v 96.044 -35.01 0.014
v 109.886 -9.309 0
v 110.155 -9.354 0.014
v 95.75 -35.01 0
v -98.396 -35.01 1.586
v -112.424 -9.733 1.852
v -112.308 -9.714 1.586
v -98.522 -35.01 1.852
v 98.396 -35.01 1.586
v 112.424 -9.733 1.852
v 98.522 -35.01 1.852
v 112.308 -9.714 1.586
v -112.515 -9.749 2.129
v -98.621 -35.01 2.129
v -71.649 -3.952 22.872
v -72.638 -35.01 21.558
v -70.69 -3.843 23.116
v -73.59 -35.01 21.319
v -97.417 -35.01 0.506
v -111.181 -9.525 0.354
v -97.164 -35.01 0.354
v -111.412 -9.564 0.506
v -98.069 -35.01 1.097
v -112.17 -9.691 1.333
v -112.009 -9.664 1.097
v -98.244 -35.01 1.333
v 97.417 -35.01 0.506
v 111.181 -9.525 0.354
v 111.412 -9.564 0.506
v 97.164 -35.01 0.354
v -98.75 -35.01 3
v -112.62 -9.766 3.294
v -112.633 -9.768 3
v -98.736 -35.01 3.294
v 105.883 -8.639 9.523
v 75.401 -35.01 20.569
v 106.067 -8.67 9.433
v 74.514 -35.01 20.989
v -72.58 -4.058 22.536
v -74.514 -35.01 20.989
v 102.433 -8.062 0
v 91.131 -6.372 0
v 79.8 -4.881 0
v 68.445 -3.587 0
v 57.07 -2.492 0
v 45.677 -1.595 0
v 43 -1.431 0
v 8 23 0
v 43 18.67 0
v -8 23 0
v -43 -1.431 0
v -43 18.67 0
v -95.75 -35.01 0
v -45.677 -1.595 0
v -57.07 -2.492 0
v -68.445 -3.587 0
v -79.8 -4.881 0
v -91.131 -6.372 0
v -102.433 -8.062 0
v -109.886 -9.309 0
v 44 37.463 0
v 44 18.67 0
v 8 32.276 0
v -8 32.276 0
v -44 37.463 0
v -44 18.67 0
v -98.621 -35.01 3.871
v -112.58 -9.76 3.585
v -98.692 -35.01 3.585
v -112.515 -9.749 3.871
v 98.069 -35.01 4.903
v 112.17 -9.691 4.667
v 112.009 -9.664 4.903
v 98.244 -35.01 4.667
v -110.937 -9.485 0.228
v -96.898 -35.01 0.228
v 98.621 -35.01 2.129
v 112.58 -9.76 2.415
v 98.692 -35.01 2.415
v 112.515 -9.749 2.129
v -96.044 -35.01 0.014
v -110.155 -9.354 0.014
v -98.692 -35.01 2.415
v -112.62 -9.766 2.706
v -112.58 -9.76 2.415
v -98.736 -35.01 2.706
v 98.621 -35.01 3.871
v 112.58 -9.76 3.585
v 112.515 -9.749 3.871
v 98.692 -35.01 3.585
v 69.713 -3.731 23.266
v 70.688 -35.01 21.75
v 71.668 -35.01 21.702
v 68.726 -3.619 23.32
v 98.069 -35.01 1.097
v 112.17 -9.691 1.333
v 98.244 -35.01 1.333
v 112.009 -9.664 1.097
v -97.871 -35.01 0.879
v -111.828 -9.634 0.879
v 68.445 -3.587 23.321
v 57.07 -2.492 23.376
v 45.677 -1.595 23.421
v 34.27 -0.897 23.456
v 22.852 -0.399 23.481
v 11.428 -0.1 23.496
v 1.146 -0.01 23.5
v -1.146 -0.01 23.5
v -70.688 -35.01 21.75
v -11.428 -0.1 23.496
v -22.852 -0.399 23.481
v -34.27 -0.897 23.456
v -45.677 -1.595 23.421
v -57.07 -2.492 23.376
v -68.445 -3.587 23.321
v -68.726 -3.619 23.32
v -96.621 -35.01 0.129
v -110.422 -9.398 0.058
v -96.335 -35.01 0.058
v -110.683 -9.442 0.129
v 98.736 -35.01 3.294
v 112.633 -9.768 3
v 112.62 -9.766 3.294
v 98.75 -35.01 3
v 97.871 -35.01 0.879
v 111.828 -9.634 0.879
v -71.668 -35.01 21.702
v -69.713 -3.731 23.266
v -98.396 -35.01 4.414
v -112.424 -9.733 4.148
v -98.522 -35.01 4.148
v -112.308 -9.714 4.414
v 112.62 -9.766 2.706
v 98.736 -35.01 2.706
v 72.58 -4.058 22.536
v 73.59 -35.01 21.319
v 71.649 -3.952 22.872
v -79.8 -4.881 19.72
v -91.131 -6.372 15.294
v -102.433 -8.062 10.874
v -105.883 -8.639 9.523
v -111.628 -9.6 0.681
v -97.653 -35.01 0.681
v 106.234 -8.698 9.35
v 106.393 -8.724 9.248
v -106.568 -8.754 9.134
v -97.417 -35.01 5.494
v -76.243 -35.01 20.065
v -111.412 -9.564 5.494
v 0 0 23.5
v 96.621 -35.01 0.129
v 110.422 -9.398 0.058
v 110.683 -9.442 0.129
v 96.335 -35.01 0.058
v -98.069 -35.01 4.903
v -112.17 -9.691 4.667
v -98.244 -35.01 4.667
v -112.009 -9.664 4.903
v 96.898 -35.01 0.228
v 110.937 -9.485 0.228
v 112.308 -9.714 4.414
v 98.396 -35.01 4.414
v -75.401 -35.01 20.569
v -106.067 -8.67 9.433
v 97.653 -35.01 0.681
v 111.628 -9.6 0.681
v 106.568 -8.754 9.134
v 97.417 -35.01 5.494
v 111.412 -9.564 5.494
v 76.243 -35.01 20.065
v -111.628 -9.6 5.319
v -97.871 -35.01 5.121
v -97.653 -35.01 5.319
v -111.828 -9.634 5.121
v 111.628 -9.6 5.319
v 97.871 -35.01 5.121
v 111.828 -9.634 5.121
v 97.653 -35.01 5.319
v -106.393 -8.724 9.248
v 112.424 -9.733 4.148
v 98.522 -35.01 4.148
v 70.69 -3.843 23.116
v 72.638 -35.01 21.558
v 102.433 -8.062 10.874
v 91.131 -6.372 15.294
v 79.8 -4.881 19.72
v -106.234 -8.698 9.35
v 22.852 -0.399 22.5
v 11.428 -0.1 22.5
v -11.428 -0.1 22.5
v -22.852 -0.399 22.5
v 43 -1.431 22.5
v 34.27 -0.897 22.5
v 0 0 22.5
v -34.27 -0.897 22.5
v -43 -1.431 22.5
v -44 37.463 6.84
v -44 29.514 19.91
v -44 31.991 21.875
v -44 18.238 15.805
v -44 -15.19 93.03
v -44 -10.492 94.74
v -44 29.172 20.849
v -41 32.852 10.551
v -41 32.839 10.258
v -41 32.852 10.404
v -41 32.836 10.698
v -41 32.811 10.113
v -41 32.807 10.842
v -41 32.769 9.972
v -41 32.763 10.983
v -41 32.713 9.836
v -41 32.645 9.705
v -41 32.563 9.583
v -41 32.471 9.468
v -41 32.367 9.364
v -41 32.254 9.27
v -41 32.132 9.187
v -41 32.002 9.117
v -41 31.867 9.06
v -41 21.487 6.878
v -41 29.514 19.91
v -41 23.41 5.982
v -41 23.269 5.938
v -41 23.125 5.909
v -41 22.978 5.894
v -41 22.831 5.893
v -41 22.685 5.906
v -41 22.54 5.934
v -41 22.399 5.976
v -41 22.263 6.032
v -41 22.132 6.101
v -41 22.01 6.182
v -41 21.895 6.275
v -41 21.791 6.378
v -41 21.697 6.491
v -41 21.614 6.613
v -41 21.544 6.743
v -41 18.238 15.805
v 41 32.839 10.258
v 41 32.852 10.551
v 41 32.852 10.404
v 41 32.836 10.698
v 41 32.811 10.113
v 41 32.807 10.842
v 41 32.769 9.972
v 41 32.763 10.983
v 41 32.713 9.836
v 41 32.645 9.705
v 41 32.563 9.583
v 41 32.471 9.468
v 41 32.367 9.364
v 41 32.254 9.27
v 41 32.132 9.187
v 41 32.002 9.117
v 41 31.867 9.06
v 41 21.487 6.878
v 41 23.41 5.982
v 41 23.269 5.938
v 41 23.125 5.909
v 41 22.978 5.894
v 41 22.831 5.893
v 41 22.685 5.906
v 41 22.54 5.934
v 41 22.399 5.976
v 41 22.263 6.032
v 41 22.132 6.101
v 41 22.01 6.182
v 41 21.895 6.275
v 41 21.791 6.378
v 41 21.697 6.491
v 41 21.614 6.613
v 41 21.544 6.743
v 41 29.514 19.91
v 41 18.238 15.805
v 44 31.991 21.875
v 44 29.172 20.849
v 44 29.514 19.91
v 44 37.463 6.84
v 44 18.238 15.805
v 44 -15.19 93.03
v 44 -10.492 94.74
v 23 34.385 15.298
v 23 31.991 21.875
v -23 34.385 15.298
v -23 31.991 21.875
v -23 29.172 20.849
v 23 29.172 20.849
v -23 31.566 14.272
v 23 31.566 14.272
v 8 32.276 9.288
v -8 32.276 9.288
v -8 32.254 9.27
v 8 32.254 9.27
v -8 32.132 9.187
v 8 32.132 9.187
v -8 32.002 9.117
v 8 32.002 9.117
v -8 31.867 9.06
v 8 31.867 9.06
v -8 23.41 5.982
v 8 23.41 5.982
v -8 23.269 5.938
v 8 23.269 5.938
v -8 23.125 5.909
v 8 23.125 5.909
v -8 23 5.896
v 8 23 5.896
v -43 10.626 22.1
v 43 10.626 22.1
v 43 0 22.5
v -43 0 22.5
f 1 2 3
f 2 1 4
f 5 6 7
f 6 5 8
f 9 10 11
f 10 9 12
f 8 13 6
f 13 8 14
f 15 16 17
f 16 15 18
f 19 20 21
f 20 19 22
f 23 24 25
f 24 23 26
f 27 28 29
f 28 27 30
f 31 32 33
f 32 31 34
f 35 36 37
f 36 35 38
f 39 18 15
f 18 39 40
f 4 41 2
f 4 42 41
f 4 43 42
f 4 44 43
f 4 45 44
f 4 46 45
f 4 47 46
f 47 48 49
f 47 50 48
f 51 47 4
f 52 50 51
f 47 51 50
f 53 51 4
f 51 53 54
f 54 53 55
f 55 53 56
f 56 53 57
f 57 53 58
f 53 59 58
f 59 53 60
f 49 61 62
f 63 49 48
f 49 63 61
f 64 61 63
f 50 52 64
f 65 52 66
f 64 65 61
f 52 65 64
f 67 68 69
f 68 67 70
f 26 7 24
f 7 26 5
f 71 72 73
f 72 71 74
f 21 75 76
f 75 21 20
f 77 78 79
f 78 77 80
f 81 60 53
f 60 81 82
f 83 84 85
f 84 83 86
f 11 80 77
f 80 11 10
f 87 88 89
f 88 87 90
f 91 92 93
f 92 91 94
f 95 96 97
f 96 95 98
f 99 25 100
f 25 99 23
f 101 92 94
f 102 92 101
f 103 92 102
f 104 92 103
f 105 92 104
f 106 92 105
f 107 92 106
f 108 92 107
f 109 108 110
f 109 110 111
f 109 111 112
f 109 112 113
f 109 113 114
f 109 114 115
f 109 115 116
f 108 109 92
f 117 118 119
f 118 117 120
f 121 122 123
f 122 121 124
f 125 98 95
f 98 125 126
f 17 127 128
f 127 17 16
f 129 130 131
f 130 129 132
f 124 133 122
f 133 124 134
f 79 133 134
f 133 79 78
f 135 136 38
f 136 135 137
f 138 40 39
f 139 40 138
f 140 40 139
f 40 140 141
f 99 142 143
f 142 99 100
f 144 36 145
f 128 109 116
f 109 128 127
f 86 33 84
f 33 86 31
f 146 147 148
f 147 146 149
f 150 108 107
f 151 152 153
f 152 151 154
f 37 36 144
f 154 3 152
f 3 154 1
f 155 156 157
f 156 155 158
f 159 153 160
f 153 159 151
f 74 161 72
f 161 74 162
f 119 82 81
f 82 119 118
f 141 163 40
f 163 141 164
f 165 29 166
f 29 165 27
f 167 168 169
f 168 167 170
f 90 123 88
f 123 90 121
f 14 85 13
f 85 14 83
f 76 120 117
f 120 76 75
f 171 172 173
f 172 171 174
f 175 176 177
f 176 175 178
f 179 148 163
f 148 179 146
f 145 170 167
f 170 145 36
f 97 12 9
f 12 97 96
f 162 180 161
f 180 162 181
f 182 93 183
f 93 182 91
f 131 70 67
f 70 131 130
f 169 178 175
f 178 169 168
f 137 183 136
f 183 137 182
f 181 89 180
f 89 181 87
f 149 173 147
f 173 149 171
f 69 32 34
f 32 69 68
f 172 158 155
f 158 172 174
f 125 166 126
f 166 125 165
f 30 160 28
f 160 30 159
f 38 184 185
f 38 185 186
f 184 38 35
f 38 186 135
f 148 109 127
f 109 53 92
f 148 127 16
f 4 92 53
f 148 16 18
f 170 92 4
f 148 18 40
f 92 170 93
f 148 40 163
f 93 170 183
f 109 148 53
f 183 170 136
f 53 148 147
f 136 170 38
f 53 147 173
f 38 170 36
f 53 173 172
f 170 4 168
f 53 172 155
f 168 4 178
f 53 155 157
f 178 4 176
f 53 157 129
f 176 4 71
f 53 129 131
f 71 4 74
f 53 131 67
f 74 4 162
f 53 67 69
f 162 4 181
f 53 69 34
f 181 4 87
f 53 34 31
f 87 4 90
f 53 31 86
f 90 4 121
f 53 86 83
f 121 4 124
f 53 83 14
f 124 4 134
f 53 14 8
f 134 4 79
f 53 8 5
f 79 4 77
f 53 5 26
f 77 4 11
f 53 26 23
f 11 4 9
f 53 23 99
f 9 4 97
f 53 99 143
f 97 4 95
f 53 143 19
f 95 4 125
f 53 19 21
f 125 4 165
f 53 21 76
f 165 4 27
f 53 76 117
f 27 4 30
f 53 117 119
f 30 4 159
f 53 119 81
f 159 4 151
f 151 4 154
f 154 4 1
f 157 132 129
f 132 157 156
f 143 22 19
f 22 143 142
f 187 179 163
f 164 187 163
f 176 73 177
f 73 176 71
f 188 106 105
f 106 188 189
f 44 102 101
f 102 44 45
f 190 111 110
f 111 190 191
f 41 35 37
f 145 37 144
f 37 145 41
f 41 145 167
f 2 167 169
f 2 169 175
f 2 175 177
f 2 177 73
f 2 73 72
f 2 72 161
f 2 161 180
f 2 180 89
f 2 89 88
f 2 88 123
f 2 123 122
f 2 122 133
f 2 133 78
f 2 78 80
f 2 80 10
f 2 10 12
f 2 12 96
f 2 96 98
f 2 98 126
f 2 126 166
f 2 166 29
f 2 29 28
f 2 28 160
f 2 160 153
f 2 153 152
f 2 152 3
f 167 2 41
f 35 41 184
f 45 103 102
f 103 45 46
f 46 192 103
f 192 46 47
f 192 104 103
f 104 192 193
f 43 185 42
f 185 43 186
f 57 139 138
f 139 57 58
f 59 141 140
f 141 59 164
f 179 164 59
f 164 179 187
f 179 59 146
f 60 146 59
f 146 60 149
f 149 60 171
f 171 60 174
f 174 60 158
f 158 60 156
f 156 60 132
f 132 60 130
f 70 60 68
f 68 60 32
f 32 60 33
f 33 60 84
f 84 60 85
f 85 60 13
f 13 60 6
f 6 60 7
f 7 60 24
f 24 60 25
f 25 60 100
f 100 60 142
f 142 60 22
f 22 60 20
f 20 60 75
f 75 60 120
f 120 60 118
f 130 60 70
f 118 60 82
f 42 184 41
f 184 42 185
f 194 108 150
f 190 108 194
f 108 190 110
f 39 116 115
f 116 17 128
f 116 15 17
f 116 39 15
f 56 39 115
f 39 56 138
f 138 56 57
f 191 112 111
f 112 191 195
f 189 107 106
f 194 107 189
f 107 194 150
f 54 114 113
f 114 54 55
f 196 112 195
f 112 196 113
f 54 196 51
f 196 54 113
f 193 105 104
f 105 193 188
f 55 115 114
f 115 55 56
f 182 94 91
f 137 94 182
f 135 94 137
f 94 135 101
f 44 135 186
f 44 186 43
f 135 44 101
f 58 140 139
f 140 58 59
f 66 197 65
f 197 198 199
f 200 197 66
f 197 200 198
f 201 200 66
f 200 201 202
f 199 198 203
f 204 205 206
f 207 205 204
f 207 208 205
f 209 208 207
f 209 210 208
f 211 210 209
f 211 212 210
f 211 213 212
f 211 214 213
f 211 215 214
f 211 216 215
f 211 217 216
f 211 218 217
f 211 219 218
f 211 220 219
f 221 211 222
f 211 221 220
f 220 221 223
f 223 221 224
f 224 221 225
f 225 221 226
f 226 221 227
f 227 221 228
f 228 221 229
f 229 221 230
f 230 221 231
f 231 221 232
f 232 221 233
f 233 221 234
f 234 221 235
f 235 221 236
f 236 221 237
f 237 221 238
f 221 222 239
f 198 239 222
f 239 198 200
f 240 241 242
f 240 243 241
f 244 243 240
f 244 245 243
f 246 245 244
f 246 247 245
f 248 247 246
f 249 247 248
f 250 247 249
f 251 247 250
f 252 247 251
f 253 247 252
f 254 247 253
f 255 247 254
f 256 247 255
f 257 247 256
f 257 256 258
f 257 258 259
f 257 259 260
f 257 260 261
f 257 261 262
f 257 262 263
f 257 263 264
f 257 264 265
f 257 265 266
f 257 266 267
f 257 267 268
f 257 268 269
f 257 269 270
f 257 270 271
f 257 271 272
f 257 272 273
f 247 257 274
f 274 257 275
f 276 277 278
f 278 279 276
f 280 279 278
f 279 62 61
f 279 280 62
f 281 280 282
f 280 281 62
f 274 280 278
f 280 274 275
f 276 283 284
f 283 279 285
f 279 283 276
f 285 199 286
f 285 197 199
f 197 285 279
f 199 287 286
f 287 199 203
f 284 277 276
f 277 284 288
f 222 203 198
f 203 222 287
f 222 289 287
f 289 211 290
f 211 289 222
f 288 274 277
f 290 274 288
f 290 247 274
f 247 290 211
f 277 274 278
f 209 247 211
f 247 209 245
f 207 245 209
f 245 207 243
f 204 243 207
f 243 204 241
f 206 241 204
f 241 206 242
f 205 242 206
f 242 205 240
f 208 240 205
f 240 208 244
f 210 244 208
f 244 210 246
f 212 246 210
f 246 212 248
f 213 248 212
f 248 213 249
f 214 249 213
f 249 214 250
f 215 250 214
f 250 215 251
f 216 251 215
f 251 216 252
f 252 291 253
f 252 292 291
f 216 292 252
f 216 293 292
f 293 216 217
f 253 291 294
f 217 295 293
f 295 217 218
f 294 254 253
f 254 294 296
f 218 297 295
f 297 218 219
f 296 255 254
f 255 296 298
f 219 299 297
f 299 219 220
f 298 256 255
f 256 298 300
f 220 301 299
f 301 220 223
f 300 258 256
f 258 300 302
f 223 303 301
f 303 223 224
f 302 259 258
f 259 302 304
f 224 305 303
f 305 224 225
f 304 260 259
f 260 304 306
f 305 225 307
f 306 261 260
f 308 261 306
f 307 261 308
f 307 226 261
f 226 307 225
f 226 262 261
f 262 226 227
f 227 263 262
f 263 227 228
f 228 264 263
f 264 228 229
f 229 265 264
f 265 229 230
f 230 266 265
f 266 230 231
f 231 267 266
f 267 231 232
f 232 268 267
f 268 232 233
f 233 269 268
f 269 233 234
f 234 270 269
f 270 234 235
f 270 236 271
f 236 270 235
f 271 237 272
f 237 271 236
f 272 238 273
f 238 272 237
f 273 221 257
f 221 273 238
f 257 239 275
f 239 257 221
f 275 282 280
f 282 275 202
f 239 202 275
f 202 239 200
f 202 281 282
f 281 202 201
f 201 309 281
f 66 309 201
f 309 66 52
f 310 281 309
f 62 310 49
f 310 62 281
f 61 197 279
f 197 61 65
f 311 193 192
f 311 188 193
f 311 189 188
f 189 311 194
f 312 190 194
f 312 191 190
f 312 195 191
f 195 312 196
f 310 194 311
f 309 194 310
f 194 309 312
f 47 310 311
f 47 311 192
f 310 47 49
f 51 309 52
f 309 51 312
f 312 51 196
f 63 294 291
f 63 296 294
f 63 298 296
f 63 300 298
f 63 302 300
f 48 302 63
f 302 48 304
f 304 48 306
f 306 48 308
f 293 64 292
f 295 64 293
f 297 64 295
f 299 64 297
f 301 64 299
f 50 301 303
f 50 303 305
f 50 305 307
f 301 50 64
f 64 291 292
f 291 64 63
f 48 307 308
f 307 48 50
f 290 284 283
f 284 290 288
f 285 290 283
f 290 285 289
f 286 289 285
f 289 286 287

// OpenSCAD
// Phone holder for a car dashboard. A plug with the shape of the storage
// slot above the radio fills the slot completely; a neck comes out of
// the mouth and carries a cradle that the phone stands in, leaning back.
//
// The slot is a funnel: the mouth is wider and higher than the back
// panel, its upper edge drops towards both ends, and seen from above the
// mouth bows towards the cabin while the back panel is straight. The
// plug is a loft between the section at the back and the section at the
// mouth, cut off at the bowed mouth.
//
// Nothing is screwed or glued. The plug wedges into the funnel; felt or
// foam tape on its top and bottom takes up the play and protects the
// trim.
//
// Car frame: X across the car, Y out of the slot towards the cabin with
// the middle of the mouth at Y = 0, Z up with the floor of the slot at
// Z = 0.
// The STL is in the car frame and prints that way, the flat underside of
// the plug on the bed. No supports.
//
// Build:  make phone-mount        (STL and previews)
//         make phone-mount-fit    (three flat templates of the slot, fit test)
//         make phone-mount-save   (copy the STLs to models/)
// make phone-mount builds both variants, vertical and horizontal.
// See specs/car-phone-mount.md for the reasons behind the numbers.
// The slot numbers are read off photos with a ruler: print the fit test
// first.

/* [Slot: mouth] */
mouth_w   = 228;    // width of the mouth on the floor
mouth_top = 160;    // width of the level part of the upper edge
mouth_h   = 26;     // clear height in the middle
bow       = 10;     // seen from above, the middle of the mouth lies this far in front of its ends

/* [Slot: back panel] */
back_w    = 195;    // width of the back panel on the floor
back_top  = 165;    // width of the level part of its upper edge
back_ht   = 24;     // its height
slot_d    = 40;     // depth from the middle of the mouth to the back panel

/* [Plug] */
pad_t     = 1;      // felt or foam tape on the top and on the bottom of the plug
plug_clr  = 0.5;    // play in height left after the two pads
side_clr  = 1.5;    // play at each end
back_gap  = 5;      // the plug stops this far short of the back panel
r_bot     = 3;      // radius of the lower corners of the section
r_top     = 10;     // radius of the upper corners of the section

/* [Window for an indicator on the back panel] */
lamp_w    = 0;      // width of a tunnel through the plug; 0 = none
lamp_x    = 60;     // its centre along the slot
lamp_h    = 14;     // its height
lamp_z    = 4;      // floor of the tunnel above the underside of the plug

/* [Phone: Xiaomi 15T Pro, 162.7 x 77.9 x 8.0 mm, in a case] */
// "vertical" (portrait) or "horizontal" (landscape)
variant   = "vertical";
body_l    = 162.7;  // phone without case: length
body_w    = 77.9;   // width
body_t    = 8.0;    // thickness without the camera bump
case_side = 1.5;    // case wall at each edge
case_back = 2.5;    // case under the back, the height of the camera surround
play      = 1;      // play across the cradle
// depth of the channel; in landscape the camera end stands in a pocket
phone_t   = variant == "horizontal" ? 13.5 : 12;

/* [Cradle] */
cradle_x  = 0;      // centre of the cradle along the slot
tilt      = 20;     // the backrest leans back by this angle from vertical
neck_w    = 86;     // width of the neck; the cradle may be wider
lip_low   = 5;      // lip height between the corners, below the screen
corner_w  = 18;     // length of the full-height lip at each end
back_t    = 5;      // backrest thickness
ledge_t   = 4;      // ledge under the phone
lip_t     = 3;      // lip in front of the phone
lip_h     = 12;     // lip height
cheek_t   = 3;      // walls at the two sides of the phone
win_w     = 16;     // cable window in the ledge, across the phone
neck_l    = 22;     // from the mouth of the slot to the foot of the backrest
lip_clear = 10;     // the backrest must clear the edge of the dash up to this height above the slot
fil       = 1.5;    // fillet in the inner corners of the cradle

/* [Output] */
tpl_t     = 2;      // thickness of the fit-test templates
tpl_rim   = 5;      // width of their rim
// "print" (print this), "fit" (fit test), or a preview: "assembly", "side"
part = "print";

$fn = 64;
eps = 0.01;

horiz   = variant == "horizontal";
case_l  = body_l + 2 * case_side;                   // phone in its case
case_w  = body_w + 2 * case_side;
phone_w = ceil((horiz ? case_l : case_w) + play);   // width of the channel
phone_up = horiz ? case_w : case_l;                 // height of the phone above the ledge
back_h  = horiz ? 55 : 95;                          // length of the backrest above the ledge
plug_d  = slot_d - back_gap;                        // length of the plug in the middle
cut_h   = 2 * pad_t + plug_clr;                     // taken off the height of the slot
plug_h  = mouth_h - cut_h;                          // height of the plug at the mouth
cheek_h = lip_h - 1;                                // height of the pocket side walls
width   = phone_w + 2 * cheek_t;                    // cradle and neck along X
foot_z  = back_t * sin(tilt) + ledge_t * cos(tilt); // lifts the cradle so its lowest corner is at Z = 0
bow_r   = bow > 0 ? (mouth_w * mouth_w / 4 + bow * bow) / (2 * bow) : 1e6;
// Y of the rear face of the backrest at the height where it passes the dash edge
back_y  = neck_l - back_t / cos(tilt) - (mouth_h + lip_clear - foot_z) * tan(tilt);

// Slot section at depth y (0 at the middle of the mouth, -slot_d at the
// back panel). The floor width reaches mouth_w at y = -bow, where the
// ends of the mouth are; height and upper width reach the mouth values
// at y = 0.
function lerp(a, b, t) = a + (b - a) * t;
function sec_w(y)   = lerp(back_w, mouth_w, (y + slot_d) / (slot_d - bow));
function sec_top(y) = lerp(back_top, mouth_top, (y + slot_d) / slot_d);
function sec_h(y)   = lerp(back_ht, mouth_h, (y + slot_d) / slot_d);

assert(bow >= 0 && bow < slot_d - back_gap - 10, "bow leaves less than 10 mm of plug at the ends");
assert(mouth_top < mouth_w - 2 * r_top && back_top < back_w - 2 * r_top, "upper edge wider than the floor");
assert(plug_h > 10, "slot too low");
assert(plug_d > 20, "plug shorter than 20 mm: too little hold in the slot");
assert(back_y >= 2, "the backrest leans into the edge of the dash; raise neck_l or lower tilt");
assert(variant == "vertical" || variant == "horizontal", "unknown variant");
assert(neck_w <= width, "neck wider than the cradle");
assert(abs(cradle_x) + neck_w / 2 <= mouth_top / 2, "the neck leaves the level part of the mouth");
assert(lip_low < cheek_h && 2 * corner_w < phone_w - win_w, "lip corners too long or middle lip too high");
assert(win_w < phone_w - 20, "cable window wider than the ledge can spare");
assert(lip_h <= 15, "corner pockets over 15 mm cover the side buttons");
assert(lamp_w == 0 || abs(lamp_x - cradle_x) >= (lamp_w + neck_w) / 2 + 3, "the indicator window runs into the neck; move cradle_x");
assert(lamp_w == 0 || lamp_z + lamp_h <= sec_h(-plug_d) - cut_h - 3, "indicator window too high for the plug");

// Section of the plug in the X-Z plane, drawn as 2D x-y: floor width wb,
// level upper edge wt, height h.
module section(wb, wt, h) {
    hull() {
        for (s = [-1, 1]) {
            translate([s * (wb / 2 - r_bot), r_bot]) circle(r_bot);
            translate([s * (wt / 2 - r_top), h - r_top]) circle(r_top);
        }
    }
}

// Plug section at depth y, with the play taken off.
module plug_section(y) {
    section(sec_w(y) - 2 * side_clr, sec_top(y) - 2 * side_clr, sec_h(y) - cut_h);
}

// Footprint of the bowed mouth, seen from above.
module bow2d() {
    translate([0, -bow_r]) circle(r = bow_r, $fn = 360);
}

module plug() {
    difference() {
        intersection() {
            hull() for (y = [-plug_d, 0])
                translate([0, y, 0]) rotate([90, 0, 0]) linear_extrude(eps) plug_section(y);
            translate([0, 0, -1]) linear_extrude(mouth_h + 2) bow2d();
        }
        if (lamp_w > 0)
            translate([lamp_x - lamp_w / 2, -slot_d, lamp_z]) cube([lamp_w, slot_d + 1, lamp_h]);
    }
}

// Cradle section, local frame: the back of the phone on x = 0, its
// lower edge on y = 0.
module cradle2d() {
    translate([-back_t, -ledge_t]) square([back_t, back_h + ledge_t]);
    translate([-back_t, -ledge_t]) square([back_t + phone_t + lip_t, ledge_t]);
    translate([phone_t, 0]) square([lip_t, lip_h]);
}

// Local cradle frame -> side profile (Y-Z).
module placed() {
    translate([neck_l, foot_z]) rotate(tilt) children();
}

// Side profile of the cradle in the Y-Z plane, drawn as 2D x-y.
function foot_y0() = neck_l - back_t * cos(tilt) + ledge_t * sin(tilt);
module profile() {
    foot_y1 = neck_l + (phone_t + lip_t) * cos(tilt) + ledge_t * sin(tilt);
    // closing: rounds the inner corners only
    offset(r = -fil) offset(delta = fil) union() {
        placed() cradle2d();
        // foot: the ledge filled down to Z = 0, so nothing overhangs
        hull() {
            placed() translate([-back_t, -ledge_t]) square([back_t + phone_t + lip_t, ledge_t]);
            translate([foot_y0(), 0]) square([foot_y1 - foot_y0(), eps]);
        }
    }
}

// Side profile of the neck: from inside the plug into the backrest and
// the foot. It ends inside them, so it shares no face with the cradle
// except the underside.
module neck2d() {
    hull() {
        translate([-plug_d / 2, 0]) square([plug_d / 2, plug_h - 1]);
        placed() translate([-back_t, -ledge_t / 2]) square([back_t / 2, plug_h - 1 - ledge_t / 2]);
        translate([foot_y0() + 0.5, 0]) square([1, 0.3]);
    }
}

// Profile (Y-Z) -> car frame, extruded along X from x0 over w.
module along_x(x0, w) {
    translate([x0, 0, 0]) rotate([0, 0, 90]) rotate([90, 0, 0]) linear_extrude(w) children();
}

module cradle() {
    x0 = cradle_x - width / 2;
    difference() {
        union() {
            along_x(x0, width) profile();
            along_x(cradle_x - neck_w / 2, neck_w) neck2d();
            // side walls of the corner pockets: the channel closed at both
            // ends. They end inside the backrest, the ledge and the lip and
            // 1 mm under the lip top, so no face of theirs lies in a face of
            // the profile.
            for (x = [x0, x0 + width - cheek_t])
                along_x(x, cheek_t) placed() translate([-back_t / 2, -ledge_t / 2])
                    square([back_t / 2 + phone_t + lip_t / 2, ledge_t / 2 + cheek_h]);
        }
        // cable window: straight down through ledge and foot, in front of
        // the backrest and behind the lip
        translate([cradle_x - win_w / 2, neck_l + 1, -1])
            cube([win_w, phone_t * cos(tilt) - 2, foot_z + phone_t * sin(tilt) + 3]);
        // lip lowered between the corners, so it stays below the screen
        along_x(x0 + cheek_t + corner_w, width - 2 * (cheek_t + corner_w))
            placed() translate([phone_t - 0.5, lip_low]) square([lip_t + 2, lip_h]);
    }
}

module mount() {
    plug();
    cradle();
}

// Fit test: flat rings with the outline of the plug seen from the
// front, at its rear end, and seen from above.
module ring() {
    difference() {
        children();
        offset(delta = -tpl_rim) children();
    }
}

module templates() {
    linear_extrude(tpl_t) {
        // front view: the widest floor (at the ends of the mouth) with the
        // height and upper edge of the middle
        ring() section(sec_w(-bow) - 2 * side_clr, sec_top(0) - 2 * side_clr, sec_h(0) - cut_h);
        translate([0, mouth_h + 4]) ring() plug_section(-plug_d);
        translate([0, -6]) ring() projection() plug();
    }
}

module phone() {
    along_x(cradle_x - phone_w / 2 + 0.5, phone_w - 1)
        placed() translate([0.5, 0]) square([phone_t - 3, phone_up]);
}

module dash() {
    // trim under the slot, with the shelf in front of the mouth
    color("Silver", 0.6) translate([0, 0, -12]) linear_extrude(12) intersection() {
        translate([0, 15]) bow2d();
        translate([-mouth_w / 2 - 20, -slot_d]) square([mouth_w + 40, slot_d + 15]);
    }
    // back panel
    color("DimGray", 0.6) translate([0, -slot_d, 0]) rotate([90, 0, 0])
        linear_extrude(3) section(back_w, back_top, back_ht);
    // dash top above the slot
    color("DimGray", 0.35) translate([0, 0, mouth_h]) linear_extrude(lip_clear) intersection() {
        bow2d();
        translate([-mouth_w / 2 - 20, -slot_d - 3]) square([mouth_w + 40, slot_d + 3]);
    }
}

if (part == "print") {
    mount();
} else if (part == "fit") {
    templates();
} else if (part == "assembly") {
    color("Orange") mount();
    color("SlateGray", 0.7) phone();
    dash();
} else if (part == "side") {
    color("Orange") mount();
    color("SlateGray", 0.5) phone();
    intersection() {
        dash();
        translate([-mouth_w, -200, -200]) cube([mouth_w, 400, 400]);
    }
} else {
    assert(false, "unknown part");
}
